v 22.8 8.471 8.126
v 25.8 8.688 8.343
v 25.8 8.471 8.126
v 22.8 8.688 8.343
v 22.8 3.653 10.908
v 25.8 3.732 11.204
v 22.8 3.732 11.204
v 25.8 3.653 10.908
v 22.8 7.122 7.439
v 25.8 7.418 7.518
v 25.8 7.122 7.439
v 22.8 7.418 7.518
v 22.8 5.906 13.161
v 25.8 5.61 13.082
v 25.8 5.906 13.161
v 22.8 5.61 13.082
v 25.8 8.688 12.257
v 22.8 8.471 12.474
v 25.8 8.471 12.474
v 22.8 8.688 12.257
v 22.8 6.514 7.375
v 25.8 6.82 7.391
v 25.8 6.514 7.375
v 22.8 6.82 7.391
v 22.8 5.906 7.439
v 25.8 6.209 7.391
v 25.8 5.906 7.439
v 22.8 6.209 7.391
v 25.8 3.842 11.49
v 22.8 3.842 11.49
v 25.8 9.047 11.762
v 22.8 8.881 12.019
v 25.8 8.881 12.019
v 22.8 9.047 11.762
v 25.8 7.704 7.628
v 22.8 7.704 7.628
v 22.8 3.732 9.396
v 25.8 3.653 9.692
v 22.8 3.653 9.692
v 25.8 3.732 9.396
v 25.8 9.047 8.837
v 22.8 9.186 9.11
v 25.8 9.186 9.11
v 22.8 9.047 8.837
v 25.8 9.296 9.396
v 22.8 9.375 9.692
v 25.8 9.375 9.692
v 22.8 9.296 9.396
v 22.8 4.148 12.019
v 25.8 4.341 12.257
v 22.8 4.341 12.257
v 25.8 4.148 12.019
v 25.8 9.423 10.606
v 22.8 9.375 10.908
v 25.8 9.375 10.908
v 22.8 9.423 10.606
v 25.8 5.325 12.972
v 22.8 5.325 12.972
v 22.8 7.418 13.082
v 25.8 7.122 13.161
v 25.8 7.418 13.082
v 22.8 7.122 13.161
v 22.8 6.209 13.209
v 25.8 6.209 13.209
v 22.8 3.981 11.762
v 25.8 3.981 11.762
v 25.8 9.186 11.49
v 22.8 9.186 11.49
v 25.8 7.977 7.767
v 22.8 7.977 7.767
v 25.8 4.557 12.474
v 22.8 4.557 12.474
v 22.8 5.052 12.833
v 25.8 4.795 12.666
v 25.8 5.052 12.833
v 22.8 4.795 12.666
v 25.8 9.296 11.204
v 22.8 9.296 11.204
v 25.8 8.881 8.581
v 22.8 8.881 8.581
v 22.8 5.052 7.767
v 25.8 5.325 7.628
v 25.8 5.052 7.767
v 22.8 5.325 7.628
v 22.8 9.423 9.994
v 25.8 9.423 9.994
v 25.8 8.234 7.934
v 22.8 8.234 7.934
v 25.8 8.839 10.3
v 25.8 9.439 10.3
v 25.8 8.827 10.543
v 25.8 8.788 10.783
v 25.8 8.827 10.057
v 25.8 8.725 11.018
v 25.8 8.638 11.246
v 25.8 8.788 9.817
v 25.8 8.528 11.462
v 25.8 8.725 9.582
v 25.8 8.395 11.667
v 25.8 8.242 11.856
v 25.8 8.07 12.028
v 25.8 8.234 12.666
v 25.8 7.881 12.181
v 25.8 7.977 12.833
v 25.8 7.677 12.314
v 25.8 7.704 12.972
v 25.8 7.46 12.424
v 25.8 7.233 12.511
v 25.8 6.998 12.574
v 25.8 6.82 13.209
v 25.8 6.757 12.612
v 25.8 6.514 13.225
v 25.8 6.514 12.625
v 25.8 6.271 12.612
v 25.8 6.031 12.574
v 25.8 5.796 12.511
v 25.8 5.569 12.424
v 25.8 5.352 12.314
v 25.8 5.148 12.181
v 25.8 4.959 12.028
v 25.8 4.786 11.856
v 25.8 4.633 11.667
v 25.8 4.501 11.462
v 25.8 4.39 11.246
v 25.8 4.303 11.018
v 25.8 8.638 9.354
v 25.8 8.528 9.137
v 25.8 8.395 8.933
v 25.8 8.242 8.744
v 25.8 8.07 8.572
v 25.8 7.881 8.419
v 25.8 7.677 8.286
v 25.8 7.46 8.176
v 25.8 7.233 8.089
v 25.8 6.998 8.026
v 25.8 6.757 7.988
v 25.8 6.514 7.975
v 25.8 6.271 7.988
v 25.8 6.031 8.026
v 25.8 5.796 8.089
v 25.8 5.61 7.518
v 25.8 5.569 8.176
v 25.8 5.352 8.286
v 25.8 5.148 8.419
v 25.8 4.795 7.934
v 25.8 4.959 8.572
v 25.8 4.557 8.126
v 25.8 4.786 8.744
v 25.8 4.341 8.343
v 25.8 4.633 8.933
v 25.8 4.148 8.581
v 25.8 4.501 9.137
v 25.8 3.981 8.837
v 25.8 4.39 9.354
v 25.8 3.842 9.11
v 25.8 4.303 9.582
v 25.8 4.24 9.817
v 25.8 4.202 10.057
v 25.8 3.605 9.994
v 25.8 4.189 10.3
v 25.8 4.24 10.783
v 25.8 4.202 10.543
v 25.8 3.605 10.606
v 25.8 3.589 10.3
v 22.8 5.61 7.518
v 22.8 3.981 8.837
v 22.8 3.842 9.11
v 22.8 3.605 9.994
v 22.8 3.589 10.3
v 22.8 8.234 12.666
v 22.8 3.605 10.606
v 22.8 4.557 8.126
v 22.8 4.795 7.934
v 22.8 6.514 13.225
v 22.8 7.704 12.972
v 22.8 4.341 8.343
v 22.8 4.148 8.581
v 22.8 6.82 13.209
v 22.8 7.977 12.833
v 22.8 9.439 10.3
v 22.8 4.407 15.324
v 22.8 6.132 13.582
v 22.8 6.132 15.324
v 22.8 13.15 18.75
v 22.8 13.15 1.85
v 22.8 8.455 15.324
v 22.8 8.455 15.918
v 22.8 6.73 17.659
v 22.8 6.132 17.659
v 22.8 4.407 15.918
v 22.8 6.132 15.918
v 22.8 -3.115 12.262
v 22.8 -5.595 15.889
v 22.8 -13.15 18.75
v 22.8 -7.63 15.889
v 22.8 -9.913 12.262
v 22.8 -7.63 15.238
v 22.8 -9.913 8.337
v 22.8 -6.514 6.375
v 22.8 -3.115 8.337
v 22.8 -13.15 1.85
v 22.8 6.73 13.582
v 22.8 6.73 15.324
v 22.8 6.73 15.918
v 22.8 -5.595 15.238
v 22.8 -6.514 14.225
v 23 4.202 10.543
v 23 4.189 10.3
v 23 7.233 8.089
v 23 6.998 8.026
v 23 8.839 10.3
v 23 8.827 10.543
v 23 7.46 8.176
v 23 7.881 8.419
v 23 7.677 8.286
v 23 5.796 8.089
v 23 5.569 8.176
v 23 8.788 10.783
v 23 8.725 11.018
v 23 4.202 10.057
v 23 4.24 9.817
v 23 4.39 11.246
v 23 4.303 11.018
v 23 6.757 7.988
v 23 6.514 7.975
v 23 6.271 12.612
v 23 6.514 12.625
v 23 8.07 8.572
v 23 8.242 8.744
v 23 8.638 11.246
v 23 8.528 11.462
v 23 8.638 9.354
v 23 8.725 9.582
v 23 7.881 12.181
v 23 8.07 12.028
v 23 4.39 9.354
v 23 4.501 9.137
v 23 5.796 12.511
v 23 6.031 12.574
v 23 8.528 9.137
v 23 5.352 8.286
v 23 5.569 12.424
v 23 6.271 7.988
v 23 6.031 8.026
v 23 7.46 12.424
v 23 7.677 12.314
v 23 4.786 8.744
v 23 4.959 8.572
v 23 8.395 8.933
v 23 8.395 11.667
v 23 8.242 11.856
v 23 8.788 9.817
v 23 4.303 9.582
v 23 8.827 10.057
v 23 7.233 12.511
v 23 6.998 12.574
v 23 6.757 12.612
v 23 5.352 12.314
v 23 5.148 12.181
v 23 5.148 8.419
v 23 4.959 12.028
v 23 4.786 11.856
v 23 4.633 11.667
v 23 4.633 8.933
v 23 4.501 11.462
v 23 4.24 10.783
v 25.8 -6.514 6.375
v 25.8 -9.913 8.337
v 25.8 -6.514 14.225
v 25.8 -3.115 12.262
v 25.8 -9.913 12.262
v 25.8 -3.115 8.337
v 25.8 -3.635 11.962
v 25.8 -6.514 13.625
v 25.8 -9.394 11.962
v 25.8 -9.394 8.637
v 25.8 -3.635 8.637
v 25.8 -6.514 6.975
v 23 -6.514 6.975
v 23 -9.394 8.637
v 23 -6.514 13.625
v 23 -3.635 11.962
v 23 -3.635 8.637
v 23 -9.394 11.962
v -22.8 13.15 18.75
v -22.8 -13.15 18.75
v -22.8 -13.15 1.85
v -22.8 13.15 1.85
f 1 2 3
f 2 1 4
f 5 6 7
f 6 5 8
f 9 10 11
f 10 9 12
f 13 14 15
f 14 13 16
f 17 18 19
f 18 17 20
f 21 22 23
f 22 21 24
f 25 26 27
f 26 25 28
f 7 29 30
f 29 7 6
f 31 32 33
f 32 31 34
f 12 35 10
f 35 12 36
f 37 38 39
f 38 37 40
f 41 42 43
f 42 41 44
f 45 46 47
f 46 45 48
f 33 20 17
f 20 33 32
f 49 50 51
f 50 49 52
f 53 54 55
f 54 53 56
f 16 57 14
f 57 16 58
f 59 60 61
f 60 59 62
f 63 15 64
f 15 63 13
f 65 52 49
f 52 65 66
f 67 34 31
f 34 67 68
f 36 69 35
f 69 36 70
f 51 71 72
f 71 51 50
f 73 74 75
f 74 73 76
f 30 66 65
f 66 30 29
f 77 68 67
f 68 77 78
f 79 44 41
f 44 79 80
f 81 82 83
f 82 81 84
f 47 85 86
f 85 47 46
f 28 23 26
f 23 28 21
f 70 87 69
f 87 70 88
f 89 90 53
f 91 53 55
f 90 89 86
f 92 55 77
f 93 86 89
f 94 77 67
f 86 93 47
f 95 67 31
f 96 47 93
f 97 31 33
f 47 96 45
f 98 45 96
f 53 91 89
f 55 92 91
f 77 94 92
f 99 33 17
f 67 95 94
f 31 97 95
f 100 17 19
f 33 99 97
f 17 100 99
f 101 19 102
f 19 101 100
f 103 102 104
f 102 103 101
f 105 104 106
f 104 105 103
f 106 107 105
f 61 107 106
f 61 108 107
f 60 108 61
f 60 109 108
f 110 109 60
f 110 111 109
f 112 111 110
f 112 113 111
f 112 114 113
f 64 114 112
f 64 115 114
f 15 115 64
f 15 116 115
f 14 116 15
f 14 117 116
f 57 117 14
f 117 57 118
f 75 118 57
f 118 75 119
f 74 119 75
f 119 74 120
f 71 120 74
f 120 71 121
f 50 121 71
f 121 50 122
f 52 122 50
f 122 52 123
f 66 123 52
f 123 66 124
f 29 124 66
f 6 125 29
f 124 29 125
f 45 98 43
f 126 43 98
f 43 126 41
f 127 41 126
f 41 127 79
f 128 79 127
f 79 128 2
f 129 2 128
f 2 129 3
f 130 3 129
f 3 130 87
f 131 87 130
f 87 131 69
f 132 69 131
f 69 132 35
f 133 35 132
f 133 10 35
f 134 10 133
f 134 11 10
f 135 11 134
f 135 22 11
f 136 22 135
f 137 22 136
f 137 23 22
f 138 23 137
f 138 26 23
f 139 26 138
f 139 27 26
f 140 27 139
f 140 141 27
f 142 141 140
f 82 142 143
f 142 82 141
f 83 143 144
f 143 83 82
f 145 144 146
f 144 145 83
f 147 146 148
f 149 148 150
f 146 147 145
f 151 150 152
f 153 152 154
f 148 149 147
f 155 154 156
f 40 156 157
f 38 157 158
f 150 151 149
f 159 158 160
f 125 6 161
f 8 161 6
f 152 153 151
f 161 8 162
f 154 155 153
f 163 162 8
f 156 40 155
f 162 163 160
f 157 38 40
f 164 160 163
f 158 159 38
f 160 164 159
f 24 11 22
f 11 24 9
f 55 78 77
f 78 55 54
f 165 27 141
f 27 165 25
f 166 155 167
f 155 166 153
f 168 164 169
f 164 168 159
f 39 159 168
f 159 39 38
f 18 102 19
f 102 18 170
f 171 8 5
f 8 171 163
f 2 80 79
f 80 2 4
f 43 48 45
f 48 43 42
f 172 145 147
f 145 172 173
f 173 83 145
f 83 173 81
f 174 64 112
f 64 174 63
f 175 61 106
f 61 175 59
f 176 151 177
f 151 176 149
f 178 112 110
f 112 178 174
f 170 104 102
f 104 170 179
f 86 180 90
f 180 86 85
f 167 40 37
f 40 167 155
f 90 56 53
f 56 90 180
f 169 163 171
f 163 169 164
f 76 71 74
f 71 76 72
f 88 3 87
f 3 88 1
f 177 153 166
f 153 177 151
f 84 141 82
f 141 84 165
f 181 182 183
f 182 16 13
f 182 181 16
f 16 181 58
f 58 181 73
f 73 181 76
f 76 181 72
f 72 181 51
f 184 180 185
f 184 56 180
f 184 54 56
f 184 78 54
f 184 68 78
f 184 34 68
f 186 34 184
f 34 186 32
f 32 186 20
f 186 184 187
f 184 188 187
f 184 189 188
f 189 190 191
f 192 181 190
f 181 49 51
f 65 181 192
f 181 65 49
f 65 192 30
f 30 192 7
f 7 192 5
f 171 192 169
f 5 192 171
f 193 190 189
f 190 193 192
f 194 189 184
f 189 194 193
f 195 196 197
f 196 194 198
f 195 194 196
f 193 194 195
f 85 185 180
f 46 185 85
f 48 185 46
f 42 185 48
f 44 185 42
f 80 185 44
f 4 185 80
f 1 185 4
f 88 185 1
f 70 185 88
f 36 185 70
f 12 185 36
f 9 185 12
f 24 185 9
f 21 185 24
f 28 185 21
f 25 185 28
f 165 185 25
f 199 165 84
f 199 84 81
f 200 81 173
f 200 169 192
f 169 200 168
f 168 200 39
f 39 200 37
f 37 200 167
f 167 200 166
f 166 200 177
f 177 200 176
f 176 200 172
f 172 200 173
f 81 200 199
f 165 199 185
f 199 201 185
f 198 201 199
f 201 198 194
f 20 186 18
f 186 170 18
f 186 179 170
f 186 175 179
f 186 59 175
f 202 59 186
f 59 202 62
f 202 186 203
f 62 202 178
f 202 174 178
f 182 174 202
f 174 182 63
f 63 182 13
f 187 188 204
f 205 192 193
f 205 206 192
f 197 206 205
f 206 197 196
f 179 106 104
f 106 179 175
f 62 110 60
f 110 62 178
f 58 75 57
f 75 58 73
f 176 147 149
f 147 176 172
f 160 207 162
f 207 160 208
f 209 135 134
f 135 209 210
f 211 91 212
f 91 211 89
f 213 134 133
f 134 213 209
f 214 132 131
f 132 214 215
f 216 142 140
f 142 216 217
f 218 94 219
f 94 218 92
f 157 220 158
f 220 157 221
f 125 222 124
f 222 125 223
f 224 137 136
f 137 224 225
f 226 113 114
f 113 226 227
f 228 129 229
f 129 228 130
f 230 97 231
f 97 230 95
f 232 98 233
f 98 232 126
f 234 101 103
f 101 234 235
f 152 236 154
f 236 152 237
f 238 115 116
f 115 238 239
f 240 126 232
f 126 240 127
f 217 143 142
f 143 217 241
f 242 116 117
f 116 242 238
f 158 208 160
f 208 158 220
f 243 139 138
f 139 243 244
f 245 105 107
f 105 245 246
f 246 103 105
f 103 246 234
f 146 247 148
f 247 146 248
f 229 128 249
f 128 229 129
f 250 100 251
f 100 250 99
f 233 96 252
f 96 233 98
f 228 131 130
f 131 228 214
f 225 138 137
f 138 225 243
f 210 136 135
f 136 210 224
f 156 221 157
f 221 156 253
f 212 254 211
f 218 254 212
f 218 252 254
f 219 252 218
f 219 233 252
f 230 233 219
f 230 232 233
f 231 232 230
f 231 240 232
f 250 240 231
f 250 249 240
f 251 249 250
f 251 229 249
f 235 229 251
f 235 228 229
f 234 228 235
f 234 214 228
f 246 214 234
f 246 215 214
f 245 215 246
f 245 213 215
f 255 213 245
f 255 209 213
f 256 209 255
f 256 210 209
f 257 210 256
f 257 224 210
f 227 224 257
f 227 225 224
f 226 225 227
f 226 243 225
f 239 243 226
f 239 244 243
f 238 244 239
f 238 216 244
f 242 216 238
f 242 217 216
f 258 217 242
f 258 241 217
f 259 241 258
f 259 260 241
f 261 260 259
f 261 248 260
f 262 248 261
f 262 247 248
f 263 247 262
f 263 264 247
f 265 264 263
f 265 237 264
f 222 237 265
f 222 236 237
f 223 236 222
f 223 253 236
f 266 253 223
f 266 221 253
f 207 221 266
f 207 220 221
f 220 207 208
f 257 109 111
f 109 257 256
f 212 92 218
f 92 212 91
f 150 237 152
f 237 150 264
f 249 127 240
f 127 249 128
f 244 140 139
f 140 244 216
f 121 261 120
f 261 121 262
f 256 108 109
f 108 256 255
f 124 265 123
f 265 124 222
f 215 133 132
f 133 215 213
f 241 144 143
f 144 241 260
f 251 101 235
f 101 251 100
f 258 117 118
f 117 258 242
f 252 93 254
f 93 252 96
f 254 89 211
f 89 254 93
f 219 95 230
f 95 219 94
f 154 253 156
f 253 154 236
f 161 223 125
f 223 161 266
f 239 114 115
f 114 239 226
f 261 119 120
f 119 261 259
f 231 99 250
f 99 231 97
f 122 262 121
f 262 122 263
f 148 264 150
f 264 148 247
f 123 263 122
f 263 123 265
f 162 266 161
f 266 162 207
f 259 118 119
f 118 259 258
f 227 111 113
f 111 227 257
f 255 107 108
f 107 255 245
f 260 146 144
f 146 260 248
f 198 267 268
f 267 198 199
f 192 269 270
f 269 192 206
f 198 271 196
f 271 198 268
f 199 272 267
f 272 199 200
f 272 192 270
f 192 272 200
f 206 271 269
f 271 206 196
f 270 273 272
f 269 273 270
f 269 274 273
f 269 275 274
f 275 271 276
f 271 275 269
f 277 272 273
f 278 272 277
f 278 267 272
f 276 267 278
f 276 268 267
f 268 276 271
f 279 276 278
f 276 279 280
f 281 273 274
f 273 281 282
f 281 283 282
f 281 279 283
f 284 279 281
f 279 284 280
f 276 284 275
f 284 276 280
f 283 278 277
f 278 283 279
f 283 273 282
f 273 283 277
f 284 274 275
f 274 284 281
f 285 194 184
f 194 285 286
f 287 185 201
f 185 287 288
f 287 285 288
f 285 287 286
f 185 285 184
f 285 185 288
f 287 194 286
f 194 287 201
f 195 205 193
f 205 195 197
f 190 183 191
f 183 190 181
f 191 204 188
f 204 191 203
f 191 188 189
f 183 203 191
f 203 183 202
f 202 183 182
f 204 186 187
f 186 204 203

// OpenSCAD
// pile carrée de 9 volts

//___________________________________VARIABLES__________________________________
afficher_pile    ="o"; //o,n
rotation_360      ="z"; //x,y,z,f,n
mouvement_hauteur ="n";
//___________________________________ANIMATIONS/CONDITIONS______________________
//Mettre :     FPS : 50  -----------    Etapes : 50    -----------
if(afficher_pile=="o")
{
if(rotation_360=="z" && mouvement_hauteur=="o")
translate([0,0,45]) rotate([0,0,360*$t]) 
translate([0,0,-45*$t]) translate([0,0,2.2]) pile_9V();
else if(rotation_360=="x" && mouvement_hauteur=="o")
translate([0,0,45]) rotate([0,-360*$t,0])
translate([0,0,-45*$t]) pile_9V();
else if(rotation_360=="y" && mouvement_hauteur=="o")
translate([0,0,45]) rotate([360*$t,0,0])
translate([0,0,-45*$t]) pile_9V();
else if(rotation_360 =="n" && mouvement_hauteur=="o")
translate([0,0,45]) translate([0,0,-45*$t]) pile_9V();
else if(rotation_360 =="f")
pile_9V();
else if(rotation_360=="y" && mouvement_hauteur=="n")translate([0,0,1.85]) 
rotate([360*$t,0,0]) pile_9V();
else if(rotation_360=="x" && mouvement_hauteur=="n")translate([0,0,1.85]) 
rotate([0,360*$t,0]) pile_9V();
else if(rotation_360=="z" && mouvement_hauteur=="n")translate([0,0,1.85]) 
rotate([0,0,360*$t]) pile_9V();
else if(rotation_360=="n" && mouvement_hauteur=="n") 
rotate([0,0,-90]) pile_9V();
else
{ }
}
//___________________________________MODULES__________________________________  
module pile_9V()
{
 union()
 {
 color ("DeepSkyBlue", 0.98) translate([0,0,16.9/2]) cube([45.6,26.3,16.9], center = true);
 difference()
 {
  color("lightblue")translate([45.6/2+1.5,45.6/7,16.9/2])rotate([0,90,0])cylinder(d=5.85,h=3,$fn=60, center=true); 
  color("lightblue")translate([45.6/2+1.5+0.2,45.6/7,16.9/2])rotate([0,90,0])cylinder(d=4.65,h=3,$fn=60, center=true);     
 } 
 difference()
 { 
  color("lightblue") translate([45.6/2+1.5,-(45.6/7),16.9/2])rotate([0,90,0])cylinder(d=7.85,h=3,$fn=6, center=true); 
  color("lightblue") translate([45.6/2+1.5+0.2,-(45.6/7),16.9/2])rotate([0,90,0])cylinder(d=6.65,h=3,$fn=6, center=true);      
 }
 }
    //texte
    color("White") translate([45.6/2-0.0109,-8,11.5]) rotate([90,0,90]) linear_extrude(height=0.01105) text("-", font = "Arial", size=6, spacing=1.0);
    color("White") translate([45.6/2-0.0109,4,11]) rotate([90,0,90]) linear_extrude(height=0.01105) text("+", font = "Arial", size=6, spacing=1.0);
}
